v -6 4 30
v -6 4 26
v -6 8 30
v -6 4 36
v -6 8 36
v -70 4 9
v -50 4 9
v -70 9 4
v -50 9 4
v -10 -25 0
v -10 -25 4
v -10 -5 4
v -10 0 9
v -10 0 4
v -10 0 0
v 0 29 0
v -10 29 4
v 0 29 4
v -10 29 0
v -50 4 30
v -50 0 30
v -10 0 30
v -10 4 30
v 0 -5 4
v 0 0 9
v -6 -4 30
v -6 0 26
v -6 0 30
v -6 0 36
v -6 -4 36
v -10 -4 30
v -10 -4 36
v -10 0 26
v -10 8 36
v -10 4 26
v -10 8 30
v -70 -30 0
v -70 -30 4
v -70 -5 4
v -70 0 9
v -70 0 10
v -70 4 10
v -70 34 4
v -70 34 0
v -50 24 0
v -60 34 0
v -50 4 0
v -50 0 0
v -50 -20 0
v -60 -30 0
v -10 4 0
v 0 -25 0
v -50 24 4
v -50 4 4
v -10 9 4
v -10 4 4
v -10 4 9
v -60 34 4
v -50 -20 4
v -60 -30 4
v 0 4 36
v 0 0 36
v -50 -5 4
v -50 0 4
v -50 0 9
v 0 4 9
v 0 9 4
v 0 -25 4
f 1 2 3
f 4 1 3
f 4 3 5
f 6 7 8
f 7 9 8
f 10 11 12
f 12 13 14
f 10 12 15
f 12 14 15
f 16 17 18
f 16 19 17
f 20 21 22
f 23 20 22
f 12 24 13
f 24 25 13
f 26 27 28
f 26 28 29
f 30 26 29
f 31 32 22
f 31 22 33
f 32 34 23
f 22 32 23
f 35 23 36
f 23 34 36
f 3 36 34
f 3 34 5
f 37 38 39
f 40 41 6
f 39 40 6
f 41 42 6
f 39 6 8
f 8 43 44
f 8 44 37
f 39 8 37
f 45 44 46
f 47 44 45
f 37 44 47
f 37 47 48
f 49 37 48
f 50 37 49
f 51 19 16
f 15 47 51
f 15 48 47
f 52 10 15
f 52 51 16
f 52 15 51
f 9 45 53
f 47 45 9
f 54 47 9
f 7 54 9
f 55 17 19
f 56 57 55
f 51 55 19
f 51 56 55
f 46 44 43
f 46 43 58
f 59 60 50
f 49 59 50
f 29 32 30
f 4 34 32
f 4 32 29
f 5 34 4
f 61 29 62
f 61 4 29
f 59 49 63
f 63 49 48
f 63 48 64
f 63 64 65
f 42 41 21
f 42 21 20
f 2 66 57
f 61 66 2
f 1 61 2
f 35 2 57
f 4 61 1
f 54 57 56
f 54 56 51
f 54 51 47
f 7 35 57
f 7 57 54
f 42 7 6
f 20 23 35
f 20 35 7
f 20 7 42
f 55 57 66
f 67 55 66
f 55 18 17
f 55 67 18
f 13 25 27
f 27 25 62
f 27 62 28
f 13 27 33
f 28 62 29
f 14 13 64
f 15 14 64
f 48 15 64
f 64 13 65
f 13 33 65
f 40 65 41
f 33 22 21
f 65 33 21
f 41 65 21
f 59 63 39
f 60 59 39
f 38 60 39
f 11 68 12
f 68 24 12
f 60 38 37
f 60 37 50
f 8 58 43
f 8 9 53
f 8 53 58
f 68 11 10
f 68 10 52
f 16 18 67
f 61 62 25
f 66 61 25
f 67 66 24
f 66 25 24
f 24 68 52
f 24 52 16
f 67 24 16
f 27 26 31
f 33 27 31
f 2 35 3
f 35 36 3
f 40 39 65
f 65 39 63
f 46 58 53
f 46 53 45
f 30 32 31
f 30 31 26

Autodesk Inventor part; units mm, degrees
ref_plane "YZ Plane" through (0, 0, 0) normal (1, 0, 0) x (0, 1, 0)
ref_plane "XZ Plane" through (0, 0, 0) normal (0, 1, 0) x (-1, 0, 0)
ref_plane "XY Plane" through (0, 0, 0) normal (0, 0, 1) x (1, 0, 0)
sketch "Boceto1" plane through (0, 0, 0) normal (0, 1, 0) x (-1, 0, 0)
  line L0 (0, 0) -> (70, 0)
  line L1 (70, 0) -> (70, 30)
  line L2 (70, 30) -> (0, 30)
  line L3 (0, 30) -> (0, 0)
  line L4 (0, 30) -> (10, 30)
  line L5 (10, 30) -> (10, 36)
  line L6 (10, 36) -> (0, 36)
  line L7 (0, 36) -> (0, 30)
  dimension "d0" = 10
  dimension "d14" = 70
extrude "Extrusión1" add sketch "Boceto1" along normal blind 4
sketch "Boceto2" plane through (0, 4, 0) normal (0, 1, 0) x (1, 0, 0)
  line L0 (-10, -30) -> (-6, -30)
  line L1 (-6, -30) -> (-6, -36)
  line L2 (-6, -36) -> (-10, -36)
  line L3 (-10, -36) -> (-10, -30)
extrude "Extrusión2" add sketch "Boceto2" along normal blind 4
chamfer "Chaflán1" distance 20 angle 45 1 edges at (-70, 2, 30)
sketch "Boceto6" plane through (0, 4, 0) normal (0, 1, 0) x (1, 0, 0)
  line L0 (-70, 0) -> (-50, 0)
  line L1 (-50, 0) -> (-50, -4)
  line L2 (-50, -4) -> (-70, -4)
  line L3 (-70, -4) -> (-70, 0)
  dimension "d15" = 20
extrude "Extrusión4" add sketch "Boceto6" along normal blind 30
chamfer "Chaflán2" distance 10 angle 45 1 edges at (-50, 34, 2)
sketch "Boceto7" plane through (0, 0, 0) normal (0, -1, 0) x (1, 0, 0)
  line L0 (-70, 0) -> (-50, 0)
  line L1 (-50, 0) -> (-50, 4)
  line L2 (-50, 4) -> (-70, 4)
  line L3 (-70, 4) -> (-70, 0)
  dimension "d19" = 20
extrude "Extrusión5" add sketch "Boceto7" along normal blind 30
sketch "Boceto8" plane through (0, 0, 0) normal (0, -1, 0) x (1, 0, 0)
  line L0 (-10, 36) -> (0, 36) projected
  line L1 (-10, 30) -> (-6, 30)
  line L2 (-6, 30) -> (-6, 36)
  line L3 (-6, 36) -> (-10, 36)
  line L4 (-10, 36) -> (-10, 30)
extrude "Extrusión6" add sketch "Boceto8" along normal blind 4
chamfer "Chaflán3" distance 10 angle 45 1 edges at (-50, -30, 2)
sketch "Boceto9" plane through (0, 0, 0) normal (0, -1, 0) x (1, 0, 0)
  line L0 (0, 36) -> (0, 0) projected
  line L1 (0, 0) -> (0, 4)
  line L2 (0, 4) -> (-10, 4)
  line L3 (-10, 4) -> (-10, 0)
  line L4 (-10, 0) -> (0, 0)
extrude "Extrusión7" add sketch "Boceto9" along normal blind 25
sketch "Boceto10" plane through (0, 4, 0) normal (0, 1, 0) x (1, 0, 0)
  line L0 (0, -36) -> (0, 0) projected
  line L1 (0, 0) -> (0, -4)
  line L2 (0, -4) -> (-10, -4)
  line L3 (-10, -4) -> (-10, 0)
  line L4 (-10, 0) -> (0, 0)
extrude "Extrusión8" add sketch "Boceto10" along normal blind 25
chamfer "Chaflán4" distance 5 angle 45 4 edges at (-60, 0, 4) (-5, 0, 4) (-60, 4, 4) (-5, 4, 4)
chamfer "Chaflán5" distance 4 angle 45 2 edges at (-8, 4, 30) (-8, 0, 30)
properties part number "Pata"
